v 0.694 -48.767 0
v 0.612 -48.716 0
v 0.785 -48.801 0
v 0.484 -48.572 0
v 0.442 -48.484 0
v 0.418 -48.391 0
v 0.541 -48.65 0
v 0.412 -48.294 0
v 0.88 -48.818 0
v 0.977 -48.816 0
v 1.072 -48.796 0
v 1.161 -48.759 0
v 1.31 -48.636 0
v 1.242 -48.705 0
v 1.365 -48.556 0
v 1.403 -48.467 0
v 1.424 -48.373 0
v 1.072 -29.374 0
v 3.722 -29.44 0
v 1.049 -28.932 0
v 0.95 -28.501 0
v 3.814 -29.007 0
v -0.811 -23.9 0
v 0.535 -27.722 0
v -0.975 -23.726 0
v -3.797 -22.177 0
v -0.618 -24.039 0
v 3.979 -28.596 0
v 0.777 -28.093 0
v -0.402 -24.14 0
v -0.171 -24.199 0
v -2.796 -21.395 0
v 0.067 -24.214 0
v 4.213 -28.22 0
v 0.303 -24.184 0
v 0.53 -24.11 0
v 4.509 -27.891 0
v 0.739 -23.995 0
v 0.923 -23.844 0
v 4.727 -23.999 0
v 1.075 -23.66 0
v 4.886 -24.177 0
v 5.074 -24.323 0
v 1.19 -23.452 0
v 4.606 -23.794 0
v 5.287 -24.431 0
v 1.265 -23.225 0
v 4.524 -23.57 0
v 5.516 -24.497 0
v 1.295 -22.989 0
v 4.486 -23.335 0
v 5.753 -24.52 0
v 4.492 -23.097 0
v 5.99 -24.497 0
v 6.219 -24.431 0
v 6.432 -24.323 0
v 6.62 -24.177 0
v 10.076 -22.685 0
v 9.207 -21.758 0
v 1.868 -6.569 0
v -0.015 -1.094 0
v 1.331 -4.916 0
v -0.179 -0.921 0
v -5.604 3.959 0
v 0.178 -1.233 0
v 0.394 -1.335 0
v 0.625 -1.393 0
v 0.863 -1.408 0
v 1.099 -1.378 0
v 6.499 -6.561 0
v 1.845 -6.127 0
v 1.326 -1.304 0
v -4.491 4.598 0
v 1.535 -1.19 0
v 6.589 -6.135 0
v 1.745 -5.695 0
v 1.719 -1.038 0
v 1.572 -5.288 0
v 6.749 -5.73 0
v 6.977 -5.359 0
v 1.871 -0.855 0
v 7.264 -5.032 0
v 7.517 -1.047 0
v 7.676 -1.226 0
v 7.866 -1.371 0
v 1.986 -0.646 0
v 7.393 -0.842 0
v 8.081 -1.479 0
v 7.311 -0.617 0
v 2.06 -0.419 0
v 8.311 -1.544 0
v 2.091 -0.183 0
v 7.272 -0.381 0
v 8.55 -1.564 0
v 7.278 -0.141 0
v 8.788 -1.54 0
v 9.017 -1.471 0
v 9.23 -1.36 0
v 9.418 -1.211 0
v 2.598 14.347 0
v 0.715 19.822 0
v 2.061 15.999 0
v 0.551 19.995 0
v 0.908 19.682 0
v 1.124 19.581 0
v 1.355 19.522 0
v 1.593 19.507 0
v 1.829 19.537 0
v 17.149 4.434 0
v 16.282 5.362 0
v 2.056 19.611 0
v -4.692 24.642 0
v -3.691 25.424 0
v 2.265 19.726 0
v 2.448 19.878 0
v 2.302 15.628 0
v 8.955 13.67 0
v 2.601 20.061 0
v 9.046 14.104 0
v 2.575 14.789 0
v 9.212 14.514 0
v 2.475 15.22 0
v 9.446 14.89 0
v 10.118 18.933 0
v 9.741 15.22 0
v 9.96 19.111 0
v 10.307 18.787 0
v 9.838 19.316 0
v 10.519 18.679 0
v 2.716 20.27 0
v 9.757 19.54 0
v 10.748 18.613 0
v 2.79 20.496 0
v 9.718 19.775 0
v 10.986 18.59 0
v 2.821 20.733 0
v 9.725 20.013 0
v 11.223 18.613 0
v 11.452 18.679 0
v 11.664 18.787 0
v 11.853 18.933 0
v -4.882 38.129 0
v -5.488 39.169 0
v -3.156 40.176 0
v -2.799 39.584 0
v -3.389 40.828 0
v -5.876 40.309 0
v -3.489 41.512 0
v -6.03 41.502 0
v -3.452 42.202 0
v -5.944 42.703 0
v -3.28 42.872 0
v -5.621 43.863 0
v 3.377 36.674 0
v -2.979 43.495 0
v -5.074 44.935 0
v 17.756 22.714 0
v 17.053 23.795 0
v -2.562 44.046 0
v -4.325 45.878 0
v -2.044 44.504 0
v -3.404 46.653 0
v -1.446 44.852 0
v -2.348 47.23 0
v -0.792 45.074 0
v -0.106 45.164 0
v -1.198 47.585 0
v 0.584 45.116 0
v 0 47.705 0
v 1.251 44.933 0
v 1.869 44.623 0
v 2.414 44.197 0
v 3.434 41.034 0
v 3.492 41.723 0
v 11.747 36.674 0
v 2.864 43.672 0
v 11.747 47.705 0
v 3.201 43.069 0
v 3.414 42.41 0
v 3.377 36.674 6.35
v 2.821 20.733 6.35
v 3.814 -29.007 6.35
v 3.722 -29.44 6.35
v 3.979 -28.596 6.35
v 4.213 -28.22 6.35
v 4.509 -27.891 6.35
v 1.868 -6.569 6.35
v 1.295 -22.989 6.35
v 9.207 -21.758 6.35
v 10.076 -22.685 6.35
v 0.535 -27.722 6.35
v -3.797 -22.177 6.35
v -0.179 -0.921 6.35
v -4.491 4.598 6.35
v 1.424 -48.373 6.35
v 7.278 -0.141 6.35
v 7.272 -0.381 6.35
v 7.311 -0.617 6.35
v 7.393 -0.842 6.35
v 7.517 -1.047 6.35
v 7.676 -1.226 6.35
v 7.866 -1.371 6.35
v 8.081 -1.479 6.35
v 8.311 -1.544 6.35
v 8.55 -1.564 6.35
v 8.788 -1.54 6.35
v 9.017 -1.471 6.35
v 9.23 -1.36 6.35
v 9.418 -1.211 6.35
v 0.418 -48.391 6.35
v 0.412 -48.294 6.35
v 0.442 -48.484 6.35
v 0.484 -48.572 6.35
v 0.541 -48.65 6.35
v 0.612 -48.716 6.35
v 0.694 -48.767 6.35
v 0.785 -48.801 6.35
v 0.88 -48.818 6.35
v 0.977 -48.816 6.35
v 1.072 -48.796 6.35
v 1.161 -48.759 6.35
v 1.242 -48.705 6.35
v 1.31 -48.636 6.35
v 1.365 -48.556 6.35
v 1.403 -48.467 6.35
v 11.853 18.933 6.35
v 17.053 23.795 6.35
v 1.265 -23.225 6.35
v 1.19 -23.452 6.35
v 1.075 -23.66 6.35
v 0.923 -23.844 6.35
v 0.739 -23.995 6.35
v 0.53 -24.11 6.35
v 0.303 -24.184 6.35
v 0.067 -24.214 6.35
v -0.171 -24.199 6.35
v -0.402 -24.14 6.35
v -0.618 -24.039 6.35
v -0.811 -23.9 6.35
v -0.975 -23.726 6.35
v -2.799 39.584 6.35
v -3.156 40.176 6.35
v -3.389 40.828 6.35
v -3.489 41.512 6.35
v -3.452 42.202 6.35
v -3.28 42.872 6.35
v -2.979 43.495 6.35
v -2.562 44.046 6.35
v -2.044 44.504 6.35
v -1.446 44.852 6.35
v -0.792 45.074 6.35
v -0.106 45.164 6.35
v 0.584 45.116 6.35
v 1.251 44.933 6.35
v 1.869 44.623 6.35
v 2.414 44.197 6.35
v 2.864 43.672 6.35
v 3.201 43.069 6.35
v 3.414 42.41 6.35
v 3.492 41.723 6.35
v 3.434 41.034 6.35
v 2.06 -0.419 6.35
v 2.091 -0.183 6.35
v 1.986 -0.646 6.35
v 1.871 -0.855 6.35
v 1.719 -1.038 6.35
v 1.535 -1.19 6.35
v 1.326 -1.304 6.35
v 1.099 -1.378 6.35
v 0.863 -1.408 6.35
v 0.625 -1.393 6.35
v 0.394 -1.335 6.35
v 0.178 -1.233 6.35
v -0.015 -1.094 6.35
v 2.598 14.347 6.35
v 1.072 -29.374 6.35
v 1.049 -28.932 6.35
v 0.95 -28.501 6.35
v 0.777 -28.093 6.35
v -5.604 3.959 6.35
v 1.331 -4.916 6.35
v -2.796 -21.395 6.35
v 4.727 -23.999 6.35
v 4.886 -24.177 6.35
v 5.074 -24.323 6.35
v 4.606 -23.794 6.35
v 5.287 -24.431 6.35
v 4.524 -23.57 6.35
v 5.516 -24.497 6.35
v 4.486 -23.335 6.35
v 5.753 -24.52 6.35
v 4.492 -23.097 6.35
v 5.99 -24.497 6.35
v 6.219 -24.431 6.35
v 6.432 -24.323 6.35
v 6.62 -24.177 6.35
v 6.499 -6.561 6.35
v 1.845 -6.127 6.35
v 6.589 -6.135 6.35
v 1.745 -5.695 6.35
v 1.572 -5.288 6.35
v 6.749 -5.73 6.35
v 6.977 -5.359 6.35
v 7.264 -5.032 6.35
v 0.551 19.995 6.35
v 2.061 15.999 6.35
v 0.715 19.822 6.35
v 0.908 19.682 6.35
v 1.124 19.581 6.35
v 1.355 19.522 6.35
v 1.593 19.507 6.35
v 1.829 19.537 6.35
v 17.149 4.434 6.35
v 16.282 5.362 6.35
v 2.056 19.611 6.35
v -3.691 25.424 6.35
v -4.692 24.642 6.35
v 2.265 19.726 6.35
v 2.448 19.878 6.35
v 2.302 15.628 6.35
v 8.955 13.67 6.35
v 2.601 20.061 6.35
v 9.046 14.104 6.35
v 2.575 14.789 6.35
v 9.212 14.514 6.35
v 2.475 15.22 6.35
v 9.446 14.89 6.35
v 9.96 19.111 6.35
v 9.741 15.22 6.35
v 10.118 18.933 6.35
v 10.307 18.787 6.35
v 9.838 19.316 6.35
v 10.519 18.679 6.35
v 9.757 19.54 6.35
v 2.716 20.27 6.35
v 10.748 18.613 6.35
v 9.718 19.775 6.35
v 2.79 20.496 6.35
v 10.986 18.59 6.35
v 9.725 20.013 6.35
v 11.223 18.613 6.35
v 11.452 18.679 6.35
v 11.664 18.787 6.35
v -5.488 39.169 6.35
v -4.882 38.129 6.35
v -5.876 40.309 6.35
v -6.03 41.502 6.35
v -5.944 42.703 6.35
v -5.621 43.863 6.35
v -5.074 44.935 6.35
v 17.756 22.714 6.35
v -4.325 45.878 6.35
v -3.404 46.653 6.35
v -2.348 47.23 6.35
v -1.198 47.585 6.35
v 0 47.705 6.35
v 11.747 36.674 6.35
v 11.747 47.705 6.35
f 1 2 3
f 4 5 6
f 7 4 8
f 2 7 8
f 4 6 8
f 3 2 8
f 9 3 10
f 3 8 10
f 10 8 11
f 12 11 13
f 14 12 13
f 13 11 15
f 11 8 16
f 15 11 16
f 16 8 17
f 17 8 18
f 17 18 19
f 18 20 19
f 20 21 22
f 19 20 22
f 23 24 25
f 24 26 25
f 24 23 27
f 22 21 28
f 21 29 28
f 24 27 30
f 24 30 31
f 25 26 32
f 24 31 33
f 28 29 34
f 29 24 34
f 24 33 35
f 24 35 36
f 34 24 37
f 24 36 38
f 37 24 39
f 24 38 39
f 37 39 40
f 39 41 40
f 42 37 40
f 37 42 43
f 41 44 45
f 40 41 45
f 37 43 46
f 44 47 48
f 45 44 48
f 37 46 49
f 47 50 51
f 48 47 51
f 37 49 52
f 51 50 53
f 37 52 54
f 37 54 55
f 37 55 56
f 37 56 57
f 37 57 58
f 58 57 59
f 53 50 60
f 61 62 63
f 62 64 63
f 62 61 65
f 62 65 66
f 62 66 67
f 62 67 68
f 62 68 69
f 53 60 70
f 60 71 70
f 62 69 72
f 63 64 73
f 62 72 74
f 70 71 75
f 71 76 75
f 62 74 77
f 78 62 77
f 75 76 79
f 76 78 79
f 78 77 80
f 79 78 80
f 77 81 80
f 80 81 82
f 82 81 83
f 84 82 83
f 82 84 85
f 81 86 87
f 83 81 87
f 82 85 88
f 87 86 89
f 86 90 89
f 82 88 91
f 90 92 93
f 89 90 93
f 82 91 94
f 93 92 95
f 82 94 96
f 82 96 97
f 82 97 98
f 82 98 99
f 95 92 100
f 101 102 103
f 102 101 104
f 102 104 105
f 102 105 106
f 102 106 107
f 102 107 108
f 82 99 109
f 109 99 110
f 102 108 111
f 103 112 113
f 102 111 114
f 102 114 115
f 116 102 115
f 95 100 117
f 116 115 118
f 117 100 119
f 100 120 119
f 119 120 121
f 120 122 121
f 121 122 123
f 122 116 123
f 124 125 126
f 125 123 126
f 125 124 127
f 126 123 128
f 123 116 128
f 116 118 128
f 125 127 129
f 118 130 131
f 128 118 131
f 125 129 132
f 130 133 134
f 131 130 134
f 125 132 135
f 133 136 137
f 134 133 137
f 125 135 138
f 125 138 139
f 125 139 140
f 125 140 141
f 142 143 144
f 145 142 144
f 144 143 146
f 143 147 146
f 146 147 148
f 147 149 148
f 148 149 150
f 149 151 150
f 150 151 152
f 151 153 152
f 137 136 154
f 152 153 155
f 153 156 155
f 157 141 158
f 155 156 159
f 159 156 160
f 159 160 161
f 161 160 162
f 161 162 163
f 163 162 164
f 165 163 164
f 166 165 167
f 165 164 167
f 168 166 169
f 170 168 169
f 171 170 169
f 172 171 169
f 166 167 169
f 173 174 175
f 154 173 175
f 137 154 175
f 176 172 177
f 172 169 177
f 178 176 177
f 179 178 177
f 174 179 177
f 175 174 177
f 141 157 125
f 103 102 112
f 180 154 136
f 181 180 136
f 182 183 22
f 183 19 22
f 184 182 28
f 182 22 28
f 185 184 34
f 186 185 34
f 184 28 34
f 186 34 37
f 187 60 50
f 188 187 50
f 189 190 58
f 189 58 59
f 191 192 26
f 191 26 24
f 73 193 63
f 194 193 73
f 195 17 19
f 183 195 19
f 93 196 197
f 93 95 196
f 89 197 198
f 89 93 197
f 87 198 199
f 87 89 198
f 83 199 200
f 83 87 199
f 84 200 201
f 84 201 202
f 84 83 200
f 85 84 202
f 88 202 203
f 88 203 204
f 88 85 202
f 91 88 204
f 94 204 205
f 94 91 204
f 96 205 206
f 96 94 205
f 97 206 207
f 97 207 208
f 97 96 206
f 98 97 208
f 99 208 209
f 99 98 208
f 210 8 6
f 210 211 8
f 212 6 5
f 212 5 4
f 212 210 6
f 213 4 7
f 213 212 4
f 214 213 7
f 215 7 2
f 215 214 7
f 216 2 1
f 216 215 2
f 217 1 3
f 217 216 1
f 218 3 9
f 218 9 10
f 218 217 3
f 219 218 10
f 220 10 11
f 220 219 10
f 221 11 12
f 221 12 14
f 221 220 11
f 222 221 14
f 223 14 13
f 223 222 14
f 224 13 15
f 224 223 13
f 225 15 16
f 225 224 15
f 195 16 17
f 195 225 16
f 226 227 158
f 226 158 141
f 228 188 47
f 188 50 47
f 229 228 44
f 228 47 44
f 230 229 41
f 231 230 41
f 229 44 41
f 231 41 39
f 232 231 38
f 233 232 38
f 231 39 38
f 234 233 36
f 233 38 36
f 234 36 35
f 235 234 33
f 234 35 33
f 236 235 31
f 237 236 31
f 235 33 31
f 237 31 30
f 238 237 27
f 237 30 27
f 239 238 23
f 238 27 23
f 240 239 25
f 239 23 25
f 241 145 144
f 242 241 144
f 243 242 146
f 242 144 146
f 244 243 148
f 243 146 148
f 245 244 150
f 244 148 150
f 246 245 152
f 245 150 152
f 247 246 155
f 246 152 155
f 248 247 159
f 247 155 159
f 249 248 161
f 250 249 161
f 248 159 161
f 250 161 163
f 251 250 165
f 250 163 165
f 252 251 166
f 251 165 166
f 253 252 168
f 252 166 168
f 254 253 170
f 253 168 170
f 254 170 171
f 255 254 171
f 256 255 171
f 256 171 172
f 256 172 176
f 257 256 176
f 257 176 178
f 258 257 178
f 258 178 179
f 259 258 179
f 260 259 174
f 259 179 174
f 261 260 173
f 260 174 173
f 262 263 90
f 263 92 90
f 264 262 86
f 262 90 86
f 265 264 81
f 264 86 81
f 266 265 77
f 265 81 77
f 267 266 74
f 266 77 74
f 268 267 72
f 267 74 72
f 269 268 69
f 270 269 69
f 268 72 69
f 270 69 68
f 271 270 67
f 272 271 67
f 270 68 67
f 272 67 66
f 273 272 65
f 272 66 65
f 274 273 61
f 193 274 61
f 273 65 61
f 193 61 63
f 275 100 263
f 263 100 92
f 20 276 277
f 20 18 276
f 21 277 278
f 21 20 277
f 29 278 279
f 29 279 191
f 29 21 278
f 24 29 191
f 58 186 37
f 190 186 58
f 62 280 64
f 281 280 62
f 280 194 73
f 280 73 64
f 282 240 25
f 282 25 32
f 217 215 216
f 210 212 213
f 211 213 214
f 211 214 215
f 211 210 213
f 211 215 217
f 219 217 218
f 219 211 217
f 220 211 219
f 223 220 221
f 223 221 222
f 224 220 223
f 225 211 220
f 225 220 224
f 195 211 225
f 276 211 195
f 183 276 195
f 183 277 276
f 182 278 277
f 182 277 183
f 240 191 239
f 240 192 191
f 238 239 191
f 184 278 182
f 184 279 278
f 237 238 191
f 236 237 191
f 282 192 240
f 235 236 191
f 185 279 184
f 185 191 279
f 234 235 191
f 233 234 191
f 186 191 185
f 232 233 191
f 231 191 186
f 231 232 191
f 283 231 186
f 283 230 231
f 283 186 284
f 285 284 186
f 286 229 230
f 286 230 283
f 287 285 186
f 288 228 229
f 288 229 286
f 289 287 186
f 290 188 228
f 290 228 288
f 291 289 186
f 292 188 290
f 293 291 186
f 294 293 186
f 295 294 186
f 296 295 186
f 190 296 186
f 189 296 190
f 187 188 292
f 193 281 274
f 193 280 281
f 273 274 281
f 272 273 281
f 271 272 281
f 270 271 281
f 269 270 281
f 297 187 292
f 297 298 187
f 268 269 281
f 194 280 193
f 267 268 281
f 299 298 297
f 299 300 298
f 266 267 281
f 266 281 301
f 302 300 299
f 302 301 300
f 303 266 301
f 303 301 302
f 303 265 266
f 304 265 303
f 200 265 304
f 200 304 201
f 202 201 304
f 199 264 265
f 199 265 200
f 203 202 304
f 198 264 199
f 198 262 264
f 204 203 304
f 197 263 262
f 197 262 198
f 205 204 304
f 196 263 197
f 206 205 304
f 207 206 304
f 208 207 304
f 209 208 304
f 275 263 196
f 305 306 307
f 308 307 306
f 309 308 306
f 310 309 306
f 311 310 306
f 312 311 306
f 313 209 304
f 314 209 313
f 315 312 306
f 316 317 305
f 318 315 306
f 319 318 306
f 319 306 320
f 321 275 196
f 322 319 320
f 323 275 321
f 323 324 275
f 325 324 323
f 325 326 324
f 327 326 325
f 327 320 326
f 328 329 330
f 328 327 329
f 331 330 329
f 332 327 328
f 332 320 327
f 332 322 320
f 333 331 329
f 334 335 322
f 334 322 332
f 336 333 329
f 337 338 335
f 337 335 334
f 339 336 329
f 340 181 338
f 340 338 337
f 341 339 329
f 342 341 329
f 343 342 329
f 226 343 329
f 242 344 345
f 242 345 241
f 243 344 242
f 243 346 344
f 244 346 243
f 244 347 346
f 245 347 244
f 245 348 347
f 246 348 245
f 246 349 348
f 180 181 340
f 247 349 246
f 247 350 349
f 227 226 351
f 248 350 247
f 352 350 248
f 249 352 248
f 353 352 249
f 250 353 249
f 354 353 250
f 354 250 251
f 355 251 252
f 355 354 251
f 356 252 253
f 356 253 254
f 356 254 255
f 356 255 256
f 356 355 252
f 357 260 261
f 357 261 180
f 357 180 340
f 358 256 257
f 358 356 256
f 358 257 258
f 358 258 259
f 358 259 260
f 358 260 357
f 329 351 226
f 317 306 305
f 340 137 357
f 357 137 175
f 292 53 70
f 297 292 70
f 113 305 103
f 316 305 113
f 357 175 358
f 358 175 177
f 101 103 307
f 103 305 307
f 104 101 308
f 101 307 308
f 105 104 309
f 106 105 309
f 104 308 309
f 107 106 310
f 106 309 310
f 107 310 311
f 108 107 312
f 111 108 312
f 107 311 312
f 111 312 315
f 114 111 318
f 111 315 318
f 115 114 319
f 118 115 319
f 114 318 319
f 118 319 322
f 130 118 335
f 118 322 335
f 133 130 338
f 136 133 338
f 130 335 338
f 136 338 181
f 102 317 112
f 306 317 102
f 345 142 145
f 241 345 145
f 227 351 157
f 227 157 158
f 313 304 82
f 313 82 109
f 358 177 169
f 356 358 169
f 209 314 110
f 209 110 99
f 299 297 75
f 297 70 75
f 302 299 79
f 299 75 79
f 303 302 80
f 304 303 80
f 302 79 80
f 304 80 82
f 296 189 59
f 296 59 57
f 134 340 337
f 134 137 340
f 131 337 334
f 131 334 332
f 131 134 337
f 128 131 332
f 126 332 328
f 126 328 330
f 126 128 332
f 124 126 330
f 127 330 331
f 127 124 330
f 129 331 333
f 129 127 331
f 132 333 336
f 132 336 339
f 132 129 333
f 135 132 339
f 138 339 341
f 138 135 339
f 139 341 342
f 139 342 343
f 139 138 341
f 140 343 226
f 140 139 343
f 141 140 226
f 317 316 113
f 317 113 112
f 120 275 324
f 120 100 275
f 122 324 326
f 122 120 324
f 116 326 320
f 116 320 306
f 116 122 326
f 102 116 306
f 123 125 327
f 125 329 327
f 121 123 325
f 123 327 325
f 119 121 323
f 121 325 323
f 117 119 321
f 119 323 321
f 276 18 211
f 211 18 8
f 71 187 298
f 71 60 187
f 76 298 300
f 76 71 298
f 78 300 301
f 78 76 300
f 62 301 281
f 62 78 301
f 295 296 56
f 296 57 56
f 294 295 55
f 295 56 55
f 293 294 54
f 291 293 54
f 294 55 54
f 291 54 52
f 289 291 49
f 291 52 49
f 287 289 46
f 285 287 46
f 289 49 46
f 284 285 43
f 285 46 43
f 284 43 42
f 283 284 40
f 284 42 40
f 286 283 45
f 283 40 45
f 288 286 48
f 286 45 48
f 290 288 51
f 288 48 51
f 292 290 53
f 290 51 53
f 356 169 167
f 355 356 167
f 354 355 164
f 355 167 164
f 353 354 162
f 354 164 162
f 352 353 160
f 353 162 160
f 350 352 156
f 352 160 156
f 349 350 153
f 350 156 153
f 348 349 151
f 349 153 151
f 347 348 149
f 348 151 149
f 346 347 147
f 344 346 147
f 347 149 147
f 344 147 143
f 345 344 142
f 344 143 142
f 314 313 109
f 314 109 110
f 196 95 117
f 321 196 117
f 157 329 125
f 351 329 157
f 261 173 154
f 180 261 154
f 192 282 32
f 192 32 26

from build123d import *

# Parameters (mm, degrees)
F1_DEPTH = 6.35
F3_DEPTH = 6.35
F4_R     = 2.54
F5_R     = 1.27
F6_R     = 0.508


with BuildPart() as f1:
    # F0 (on Top) → F1 (new body)
    with BuildSketch(Plane.XY):
        with BuildLine():
            ThreePointArc((-2.799087249, 39.5839911841), (-0.7915221585, 45.0743154299), (3.4336560515, 41.0342848595))
            Line((3.4336560515, 41.0342848595), (3.3770644537, 36.6740419664))
            Line((3.3770644537, 36.6740419664), (0, -60.1062413045))
            Line((0, -60.1062413045), (11.7469782392, 36.6740419664))
            Line((11.7469782392, 36.6740419664), (11.7469782392, 47.7051909764))
            Line((11.7469782392, 47.7051909764), (0, 47.7051909764))
            ThreePointArc((0, 47.7051909764), (-5.3743672697, 44.4126239501), (-4.8820243994, 38.1291201766))
            Line((-4.8820243994, 38.1291201766), (-2.799087249, 39.5839911841))
        make_face()
    extrude(amount=F1_DEPTH)

    # F2 (on face) → F3 (join, through all)
    with BuildSketch(Plane.XY.offset(6.35)):
        Polygon((5.8018137756, 13.2742899137), (-3.6911324753, 25.4240408597), (-4.6918853336, 24.6421241656), (5.6555386255, 11.3987515904), (17.7563995016, 22.714386033), (17.0525390199, 23.7949541362), align=None)
        Polygon((1.969285928, -3.6702293277), (-4.4911685658, 4.5983219759), (-5.6035720791, 3.9593037682), (1.9003850991, -5.644796836), align=None)
        Polygon((16.2817840507, 5.3620055897), (6.8500791917, -3.6702293277), (6.6085731711, -5.6599343058), (17.1492698758, 4.4343222738), align=None)
        Polygon((1.1045974688, -28.4505659699), (1.1734982977, -26.4759984616), (-2.7963442028, -21.3951103577), (-3.7970970611, -22.1770270519), align=None)
        Polygon((9.207060252, -21.7584877759), (4.0716938985, -26.5606195399), (3.8336266245, -28.5219935843), (10.0760985599, -22.6845964633), align=None)
    extrude(amount=-F3_DEPTH)

    # F4
    f4_edges = [f1.edges().sort_by_distance(p)[0] for p in [
        (2.630216, 15.270776, 3.175),
        (9.066239, 14.588131, 3.175),
        (6.608573, -5.659934, 3.175),
        (1.900385, -5.644797, 3.175),
        (1.104597, -28.450566, 3.175),
        (3.833627, -28.521994, 3.175),
    ]]
    fillet(f4_edges, radius=F4_R)

    # F5
    f5_edges = [f1.edges().sort_by_distance(p)[0] for p in [
        (2.699117, 17.245343, 3.175),
        (9.304306, 16.549505, 3.175),
        (6.850079, -3.670229, 3.175),
        (1.969286, -3.670229, 3.175),
        (1.173498, -26.475998, 3.175),
        (4.071694, -26.56062, 3.175),
    ]]
    fillet(f5_edges, radius=F5_R)

    # F6
    f6_edges = [f1.edges().sort_by_distance(p)[0] for p in [
        (0, -60.106241, 3.175),
    ]]
    fillet(f6_edges, radius=F6_R)


solid = f1.part
